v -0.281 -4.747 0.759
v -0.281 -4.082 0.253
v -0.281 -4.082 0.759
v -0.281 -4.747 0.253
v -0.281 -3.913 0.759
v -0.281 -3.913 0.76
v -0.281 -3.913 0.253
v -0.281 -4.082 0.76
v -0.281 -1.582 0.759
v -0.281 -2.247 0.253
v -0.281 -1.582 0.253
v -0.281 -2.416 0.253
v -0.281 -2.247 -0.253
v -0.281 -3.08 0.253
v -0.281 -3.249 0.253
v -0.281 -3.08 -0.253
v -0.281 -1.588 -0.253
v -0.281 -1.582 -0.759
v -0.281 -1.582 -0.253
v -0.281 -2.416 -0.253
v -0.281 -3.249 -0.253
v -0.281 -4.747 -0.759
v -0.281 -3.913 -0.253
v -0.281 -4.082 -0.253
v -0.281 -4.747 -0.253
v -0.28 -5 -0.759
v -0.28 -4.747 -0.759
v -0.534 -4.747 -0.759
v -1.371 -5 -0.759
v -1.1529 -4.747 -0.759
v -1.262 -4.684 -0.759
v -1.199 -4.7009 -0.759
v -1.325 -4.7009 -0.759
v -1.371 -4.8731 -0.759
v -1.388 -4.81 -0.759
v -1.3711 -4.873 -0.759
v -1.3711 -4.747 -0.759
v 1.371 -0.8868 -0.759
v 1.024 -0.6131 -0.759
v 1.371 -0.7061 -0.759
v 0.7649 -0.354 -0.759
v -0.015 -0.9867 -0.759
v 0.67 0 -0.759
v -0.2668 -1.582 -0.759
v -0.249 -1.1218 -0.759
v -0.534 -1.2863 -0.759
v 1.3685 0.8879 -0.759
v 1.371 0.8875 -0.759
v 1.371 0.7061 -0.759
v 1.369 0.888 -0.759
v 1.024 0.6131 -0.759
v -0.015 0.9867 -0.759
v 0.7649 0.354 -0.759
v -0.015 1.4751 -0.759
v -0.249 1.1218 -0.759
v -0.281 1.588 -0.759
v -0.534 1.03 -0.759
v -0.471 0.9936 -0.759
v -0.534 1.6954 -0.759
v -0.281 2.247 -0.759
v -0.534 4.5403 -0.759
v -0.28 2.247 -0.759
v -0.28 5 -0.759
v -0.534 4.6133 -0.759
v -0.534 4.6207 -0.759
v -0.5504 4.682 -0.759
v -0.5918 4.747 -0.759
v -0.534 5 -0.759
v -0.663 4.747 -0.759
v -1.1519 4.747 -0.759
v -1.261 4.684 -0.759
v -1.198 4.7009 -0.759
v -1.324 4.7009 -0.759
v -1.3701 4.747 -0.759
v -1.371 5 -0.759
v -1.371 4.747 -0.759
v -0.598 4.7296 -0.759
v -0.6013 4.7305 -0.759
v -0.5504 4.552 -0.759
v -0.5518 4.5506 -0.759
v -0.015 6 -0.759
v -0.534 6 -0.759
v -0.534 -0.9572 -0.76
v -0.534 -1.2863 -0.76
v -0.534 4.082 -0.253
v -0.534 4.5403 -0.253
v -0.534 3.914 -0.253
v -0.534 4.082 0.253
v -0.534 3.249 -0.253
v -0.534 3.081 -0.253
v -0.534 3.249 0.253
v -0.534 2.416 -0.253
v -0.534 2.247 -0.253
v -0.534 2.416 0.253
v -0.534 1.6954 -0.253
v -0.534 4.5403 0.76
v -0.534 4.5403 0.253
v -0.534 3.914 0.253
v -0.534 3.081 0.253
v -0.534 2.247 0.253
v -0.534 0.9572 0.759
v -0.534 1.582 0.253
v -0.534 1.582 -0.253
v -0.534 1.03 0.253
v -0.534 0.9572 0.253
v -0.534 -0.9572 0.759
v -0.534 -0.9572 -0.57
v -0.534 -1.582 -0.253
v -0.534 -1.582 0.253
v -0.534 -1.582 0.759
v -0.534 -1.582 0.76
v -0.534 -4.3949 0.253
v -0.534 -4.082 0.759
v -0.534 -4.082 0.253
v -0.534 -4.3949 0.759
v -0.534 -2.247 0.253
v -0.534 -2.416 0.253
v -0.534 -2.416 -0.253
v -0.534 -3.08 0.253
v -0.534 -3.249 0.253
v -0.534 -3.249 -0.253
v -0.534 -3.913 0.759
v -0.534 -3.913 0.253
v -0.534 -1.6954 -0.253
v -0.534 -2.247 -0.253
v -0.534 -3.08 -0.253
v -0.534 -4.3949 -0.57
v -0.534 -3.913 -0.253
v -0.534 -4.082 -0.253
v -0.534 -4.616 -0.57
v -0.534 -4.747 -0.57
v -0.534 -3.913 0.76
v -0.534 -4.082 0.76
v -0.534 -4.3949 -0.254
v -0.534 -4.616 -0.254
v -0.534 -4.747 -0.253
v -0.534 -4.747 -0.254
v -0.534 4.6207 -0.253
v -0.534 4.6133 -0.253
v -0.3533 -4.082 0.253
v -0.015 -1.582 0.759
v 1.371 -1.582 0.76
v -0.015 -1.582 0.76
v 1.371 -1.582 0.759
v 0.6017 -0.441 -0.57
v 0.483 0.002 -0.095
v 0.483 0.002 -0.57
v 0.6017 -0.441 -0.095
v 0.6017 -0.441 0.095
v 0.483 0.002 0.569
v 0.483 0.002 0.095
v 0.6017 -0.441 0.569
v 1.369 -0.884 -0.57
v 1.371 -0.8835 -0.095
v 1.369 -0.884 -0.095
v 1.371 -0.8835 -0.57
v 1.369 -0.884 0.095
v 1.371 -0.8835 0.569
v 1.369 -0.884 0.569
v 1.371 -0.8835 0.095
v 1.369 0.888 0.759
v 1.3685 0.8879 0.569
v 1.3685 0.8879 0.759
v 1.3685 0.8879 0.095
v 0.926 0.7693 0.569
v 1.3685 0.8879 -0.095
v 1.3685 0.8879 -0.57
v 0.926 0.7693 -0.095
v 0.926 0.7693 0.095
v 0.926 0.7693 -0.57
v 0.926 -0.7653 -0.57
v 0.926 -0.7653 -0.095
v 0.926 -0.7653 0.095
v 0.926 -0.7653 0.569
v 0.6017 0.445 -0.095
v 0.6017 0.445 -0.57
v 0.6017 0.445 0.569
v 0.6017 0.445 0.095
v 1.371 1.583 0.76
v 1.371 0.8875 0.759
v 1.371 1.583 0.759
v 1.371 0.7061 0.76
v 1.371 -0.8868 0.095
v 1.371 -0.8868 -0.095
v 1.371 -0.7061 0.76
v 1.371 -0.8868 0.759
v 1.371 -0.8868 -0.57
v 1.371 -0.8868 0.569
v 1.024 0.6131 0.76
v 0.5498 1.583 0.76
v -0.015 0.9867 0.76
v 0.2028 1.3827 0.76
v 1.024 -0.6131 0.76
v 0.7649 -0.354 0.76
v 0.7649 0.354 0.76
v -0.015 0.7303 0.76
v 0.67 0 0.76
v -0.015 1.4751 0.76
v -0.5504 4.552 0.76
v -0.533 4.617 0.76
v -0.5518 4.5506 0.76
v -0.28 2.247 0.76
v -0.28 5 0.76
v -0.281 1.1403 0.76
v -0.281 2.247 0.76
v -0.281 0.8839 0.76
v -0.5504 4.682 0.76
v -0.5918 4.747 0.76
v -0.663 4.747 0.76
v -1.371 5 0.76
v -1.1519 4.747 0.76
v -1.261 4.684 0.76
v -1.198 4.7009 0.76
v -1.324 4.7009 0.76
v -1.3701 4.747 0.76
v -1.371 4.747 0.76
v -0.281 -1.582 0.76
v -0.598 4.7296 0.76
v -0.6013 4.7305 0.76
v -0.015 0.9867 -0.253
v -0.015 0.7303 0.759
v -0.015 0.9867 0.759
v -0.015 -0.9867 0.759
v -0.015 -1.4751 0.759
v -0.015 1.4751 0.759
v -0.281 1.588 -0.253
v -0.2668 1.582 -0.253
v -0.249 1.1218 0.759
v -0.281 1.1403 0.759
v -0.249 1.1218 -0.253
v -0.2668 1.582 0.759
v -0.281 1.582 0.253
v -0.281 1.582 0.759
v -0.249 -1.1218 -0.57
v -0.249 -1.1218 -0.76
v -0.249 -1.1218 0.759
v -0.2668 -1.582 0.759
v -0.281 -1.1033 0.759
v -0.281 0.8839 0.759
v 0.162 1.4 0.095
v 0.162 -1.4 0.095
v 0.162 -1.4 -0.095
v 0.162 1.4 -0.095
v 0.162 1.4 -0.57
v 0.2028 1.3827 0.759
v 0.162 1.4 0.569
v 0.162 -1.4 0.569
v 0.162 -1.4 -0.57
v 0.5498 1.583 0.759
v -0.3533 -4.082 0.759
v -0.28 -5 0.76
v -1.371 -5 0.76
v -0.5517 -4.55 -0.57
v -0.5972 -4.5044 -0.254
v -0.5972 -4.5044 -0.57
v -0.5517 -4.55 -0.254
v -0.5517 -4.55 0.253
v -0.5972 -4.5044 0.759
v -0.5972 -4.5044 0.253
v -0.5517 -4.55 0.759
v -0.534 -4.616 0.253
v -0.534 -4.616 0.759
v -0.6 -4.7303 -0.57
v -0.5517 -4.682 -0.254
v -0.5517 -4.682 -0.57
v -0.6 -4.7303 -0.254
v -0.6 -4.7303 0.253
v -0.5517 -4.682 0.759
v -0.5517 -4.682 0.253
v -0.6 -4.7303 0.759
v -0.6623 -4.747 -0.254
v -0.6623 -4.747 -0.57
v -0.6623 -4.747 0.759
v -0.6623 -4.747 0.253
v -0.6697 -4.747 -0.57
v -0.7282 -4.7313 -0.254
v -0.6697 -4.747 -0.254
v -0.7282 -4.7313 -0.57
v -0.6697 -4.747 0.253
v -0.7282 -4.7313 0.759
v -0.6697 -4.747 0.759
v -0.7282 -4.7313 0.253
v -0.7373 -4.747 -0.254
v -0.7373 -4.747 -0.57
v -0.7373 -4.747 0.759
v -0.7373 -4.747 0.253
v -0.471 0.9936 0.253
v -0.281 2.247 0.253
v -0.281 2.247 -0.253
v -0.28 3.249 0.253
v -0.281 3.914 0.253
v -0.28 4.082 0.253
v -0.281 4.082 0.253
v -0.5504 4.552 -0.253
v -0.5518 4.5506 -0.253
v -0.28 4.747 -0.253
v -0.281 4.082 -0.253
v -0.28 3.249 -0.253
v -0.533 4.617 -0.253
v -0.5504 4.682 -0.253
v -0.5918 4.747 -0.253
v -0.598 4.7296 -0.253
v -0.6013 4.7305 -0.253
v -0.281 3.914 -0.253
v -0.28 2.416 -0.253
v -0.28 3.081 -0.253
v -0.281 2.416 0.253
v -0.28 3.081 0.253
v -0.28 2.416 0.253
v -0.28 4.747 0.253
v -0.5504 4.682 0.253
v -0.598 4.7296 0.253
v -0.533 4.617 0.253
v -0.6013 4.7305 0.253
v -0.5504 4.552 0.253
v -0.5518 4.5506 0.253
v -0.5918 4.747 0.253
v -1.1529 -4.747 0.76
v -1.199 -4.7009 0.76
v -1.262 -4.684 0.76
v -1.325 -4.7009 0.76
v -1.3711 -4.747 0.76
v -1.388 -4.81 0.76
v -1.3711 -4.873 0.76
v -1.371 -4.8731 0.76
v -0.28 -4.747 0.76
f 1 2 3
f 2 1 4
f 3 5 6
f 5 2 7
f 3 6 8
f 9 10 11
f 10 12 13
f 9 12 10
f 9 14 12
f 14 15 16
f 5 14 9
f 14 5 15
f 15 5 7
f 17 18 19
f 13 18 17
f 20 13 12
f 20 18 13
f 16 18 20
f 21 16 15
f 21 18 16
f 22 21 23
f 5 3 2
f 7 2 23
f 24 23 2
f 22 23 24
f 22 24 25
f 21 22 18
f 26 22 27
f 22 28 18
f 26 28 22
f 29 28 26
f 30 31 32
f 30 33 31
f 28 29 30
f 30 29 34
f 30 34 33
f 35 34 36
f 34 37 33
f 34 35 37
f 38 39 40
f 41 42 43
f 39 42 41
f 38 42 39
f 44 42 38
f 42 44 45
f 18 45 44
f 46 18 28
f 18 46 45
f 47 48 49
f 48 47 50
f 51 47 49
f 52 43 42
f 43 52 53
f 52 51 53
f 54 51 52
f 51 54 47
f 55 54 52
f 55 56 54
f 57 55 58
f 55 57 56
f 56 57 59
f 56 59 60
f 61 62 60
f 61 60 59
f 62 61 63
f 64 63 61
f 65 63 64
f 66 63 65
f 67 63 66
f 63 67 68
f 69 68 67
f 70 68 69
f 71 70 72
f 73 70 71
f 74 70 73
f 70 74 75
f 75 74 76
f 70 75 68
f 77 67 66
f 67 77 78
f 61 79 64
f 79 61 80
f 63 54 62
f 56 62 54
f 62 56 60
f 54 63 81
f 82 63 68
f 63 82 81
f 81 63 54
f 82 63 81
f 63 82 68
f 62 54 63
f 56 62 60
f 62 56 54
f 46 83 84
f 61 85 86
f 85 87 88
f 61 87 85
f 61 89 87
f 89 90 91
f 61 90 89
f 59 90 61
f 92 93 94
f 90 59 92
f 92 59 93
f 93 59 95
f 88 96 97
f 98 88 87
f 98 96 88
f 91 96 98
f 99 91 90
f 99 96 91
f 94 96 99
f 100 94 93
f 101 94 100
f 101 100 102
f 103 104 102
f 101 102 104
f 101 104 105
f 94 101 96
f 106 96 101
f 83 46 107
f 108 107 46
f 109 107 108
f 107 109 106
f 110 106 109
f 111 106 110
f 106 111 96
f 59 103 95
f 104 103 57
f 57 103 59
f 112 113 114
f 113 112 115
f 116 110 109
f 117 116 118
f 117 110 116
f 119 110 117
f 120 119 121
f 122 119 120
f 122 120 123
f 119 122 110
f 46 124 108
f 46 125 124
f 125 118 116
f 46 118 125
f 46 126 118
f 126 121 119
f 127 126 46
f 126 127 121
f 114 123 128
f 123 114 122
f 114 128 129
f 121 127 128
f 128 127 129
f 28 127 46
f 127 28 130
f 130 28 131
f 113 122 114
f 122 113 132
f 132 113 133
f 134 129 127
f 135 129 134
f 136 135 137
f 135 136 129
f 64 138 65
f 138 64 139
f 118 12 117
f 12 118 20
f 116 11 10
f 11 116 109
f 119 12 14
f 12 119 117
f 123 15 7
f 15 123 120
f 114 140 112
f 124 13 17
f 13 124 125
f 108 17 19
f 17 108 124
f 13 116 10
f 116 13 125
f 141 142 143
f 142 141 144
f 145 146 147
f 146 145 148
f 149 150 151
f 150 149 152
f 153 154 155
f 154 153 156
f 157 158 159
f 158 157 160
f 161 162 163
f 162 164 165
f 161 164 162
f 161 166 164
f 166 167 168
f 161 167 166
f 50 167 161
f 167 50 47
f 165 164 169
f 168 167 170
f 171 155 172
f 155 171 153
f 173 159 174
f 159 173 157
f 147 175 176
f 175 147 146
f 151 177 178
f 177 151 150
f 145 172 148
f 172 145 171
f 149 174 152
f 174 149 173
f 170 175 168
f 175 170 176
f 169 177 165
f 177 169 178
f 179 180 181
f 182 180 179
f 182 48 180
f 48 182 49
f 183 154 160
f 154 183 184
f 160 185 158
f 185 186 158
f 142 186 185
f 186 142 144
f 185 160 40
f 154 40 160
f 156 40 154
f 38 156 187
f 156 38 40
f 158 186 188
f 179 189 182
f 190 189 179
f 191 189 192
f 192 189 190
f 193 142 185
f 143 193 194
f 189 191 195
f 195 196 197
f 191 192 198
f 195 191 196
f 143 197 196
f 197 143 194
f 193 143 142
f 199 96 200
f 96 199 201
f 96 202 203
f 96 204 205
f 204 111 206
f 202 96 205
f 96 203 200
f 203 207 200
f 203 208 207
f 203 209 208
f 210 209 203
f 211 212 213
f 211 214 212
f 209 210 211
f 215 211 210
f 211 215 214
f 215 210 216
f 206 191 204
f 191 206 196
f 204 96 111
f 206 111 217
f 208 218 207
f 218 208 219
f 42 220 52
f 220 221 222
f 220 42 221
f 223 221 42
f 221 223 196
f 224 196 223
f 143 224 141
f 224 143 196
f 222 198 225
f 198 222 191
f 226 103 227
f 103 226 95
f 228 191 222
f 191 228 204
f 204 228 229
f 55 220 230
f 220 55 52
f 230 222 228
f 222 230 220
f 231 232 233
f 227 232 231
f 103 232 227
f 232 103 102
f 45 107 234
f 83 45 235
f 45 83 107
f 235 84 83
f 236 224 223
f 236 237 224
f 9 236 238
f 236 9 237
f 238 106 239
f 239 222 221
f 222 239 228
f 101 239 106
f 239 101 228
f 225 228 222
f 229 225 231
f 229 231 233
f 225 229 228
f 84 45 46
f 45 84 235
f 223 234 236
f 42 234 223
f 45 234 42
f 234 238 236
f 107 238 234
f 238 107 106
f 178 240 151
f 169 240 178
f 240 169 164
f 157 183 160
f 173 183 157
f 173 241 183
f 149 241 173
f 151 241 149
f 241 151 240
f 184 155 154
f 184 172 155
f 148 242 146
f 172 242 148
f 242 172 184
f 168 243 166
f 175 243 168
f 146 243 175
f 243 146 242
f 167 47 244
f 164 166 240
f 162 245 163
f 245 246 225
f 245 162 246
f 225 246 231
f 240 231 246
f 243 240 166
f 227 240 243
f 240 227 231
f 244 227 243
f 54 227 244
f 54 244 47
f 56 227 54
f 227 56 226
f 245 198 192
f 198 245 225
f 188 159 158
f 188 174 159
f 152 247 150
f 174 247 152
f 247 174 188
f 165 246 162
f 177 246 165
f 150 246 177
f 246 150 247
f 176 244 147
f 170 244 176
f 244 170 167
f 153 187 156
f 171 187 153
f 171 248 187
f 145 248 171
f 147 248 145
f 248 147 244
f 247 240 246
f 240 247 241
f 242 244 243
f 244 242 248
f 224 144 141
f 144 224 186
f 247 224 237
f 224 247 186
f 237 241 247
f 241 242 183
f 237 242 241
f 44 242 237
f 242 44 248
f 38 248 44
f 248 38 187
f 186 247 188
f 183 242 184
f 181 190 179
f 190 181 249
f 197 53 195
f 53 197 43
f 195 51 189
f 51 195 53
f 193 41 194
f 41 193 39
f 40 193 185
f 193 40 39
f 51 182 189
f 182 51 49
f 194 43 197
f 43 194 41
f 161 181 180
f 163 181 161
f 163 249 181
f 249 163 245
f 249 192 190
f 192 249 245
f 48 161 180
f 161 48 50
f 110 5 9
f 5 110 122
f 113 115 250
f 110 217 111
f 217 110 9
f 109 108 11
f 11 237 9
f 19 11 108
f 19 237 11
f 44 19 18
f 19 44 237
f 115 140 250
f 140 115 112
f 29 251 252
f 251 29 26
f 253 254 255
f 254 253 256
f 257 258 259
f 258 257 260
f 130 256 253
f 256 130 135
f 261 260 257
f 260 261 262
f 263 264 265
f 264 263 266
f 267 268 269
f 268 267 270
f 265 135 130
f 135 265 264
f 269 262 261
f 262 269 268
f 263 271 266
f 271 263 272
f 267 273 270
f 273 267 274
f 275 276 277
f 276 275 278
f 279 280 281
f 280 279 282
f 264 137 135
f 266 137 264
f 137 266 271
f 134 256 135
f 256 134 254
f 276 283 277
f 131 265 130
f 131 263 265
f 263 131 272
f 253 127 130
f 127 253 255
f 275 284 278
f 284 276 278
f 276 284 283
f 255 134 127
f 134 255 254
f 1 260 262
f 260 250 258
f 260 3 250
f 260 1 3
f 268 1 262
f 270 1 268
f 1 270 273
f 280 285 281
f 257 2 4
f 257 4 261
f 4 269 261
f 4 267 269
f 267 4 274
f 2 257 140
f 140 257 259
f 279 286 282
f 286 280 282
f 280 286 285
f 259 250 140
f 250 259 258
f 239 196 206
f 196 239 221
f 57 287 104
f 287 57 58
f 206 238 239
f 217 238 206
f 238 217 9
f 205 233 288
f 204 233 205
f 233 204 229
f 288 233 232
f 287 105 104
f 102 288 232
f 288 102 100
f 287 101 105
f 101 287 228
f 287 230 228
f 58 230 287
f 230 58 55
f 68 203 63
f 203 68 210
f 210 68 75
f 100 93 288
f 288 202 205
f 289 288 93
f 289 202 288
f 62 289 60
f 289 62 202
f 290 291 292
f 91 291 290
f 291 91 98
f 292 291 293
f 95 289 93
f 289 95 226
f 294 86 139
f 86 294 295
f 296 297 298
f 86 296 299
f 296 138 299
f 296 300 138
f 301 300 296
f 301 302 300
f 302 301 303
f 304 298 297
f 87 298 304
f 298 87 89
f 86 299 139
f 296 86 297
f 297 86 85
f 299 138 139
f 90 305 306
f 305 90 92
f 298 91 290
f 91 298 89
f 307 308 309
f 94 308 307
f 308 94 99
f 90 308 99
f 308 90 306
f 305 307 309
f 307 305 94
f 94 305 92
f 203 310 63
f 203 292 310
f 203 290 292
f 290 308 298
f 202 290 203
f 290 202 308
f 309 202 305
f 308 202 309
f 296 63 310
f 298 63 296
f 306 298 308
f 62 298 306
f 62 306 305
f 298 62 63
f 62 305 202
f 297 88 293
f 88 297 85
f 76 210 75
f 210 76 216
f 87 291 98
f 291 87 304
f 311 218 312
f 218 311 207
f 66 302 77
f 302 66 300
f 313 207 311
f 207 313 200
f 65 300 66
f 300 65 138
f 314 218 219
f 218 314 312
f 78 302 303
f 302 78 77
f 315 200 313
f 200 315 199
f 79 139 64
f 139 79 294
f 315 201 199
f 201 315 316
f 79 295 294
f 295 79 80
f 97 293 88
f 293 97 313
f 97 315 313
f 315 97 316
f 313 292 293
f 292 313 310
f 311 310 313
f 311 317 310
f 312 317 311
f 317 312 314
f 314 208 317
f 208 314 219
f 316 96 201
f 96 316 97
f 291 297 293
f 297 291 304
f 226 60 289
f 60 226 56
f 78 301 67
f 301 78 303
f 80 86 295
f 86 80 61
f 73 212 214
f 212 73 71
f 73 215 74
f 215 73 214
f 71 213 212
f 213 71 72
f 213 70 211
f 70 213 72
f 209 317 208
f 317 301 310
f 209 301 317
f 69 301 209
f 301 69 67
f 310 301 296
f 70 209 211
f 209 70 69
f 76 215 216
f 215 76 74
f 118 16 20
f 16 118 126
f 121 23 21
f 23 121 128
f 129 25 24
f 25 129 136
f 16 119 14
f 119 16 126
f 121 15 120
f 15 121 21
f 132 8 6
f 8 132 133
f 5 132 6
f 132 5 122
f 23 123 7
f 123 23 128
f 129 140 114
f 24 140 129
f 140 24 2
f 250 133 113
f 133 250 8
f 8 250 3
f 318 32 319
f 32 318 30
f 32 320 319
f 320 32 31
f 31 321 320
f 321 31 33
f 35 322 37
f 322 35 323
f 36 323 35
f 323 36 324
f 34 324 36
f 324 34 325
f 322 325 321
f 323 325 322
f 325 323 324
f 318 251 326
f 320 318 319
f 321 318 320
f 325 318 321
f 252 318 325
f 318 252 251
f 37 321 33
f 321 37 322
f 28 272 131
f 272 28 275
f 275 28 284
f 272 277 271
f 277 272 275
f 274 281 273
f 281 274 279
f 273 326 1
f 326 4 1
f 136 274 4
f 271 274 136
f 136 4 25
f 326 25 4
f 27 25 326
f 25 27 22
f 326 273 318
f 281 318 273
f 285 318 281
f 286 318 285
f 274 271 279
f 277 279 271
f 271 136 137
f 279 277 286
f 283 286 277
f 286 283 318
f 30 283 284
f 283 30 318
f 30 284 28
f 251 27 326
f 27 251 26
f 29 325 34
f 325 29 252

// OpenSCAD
intersection() {
translate([-1.646, -6, -0.911]) cube(size = [3.291, 12, 1.823], center = false);
union() {
difference() {
translate([-0.534, -2.416, -0.759]) cube(size = [0.253, 0.833, 1.013], center = false);
translate([-0.534, -2.247, -0.253]) cube(size = [0.253, 0.665, 0.506], center = false);
}
translate([-0.534, -3.249, -0.253]) cube(size = [0.253, 0.169, 0.506], center = false);
translate([-0.534, -4.082, -0.253]) cube(size = [0.253, 0.169, 1.013], center = false);
difference() {
union() {
intersection() {
difference() {
translate([-0.534, -1.582, -0.759]) cube(size = [18.634, 19.682, 18.86], center = false);
translate([1.369, 0.002, -0.759])
cylinder(h = 18.86, r1 = 0.886, r2 = 0.886, center = false, $fn = 12);
}
union() {
translate([-0.015, -1.582, -0.759]) cube(size = [1.386, 3.998, 1.519], center = false);
rotate([0, 0, -30])
translate([-18.1, 0.847, -0.759]) cube(size = [19.835, 17.253, 0.506], center = false);
}
}
intersection() {
difference() {
translate([-0.534, -2.247, -18.1]) cube(size = [0.696, 3.829, 18.86], center = false);
rotate([0, 0, -30])
translate([-18.1, -1.096, -18.1]) cube(size = [36.2, 19.196, 17.53], center = false);
}
difference() {
rotate([-180, 0, 30])
translate([-18.1, -18.1, -0.759]) cube(size = [36.2, 18.947, 1.519], center = false);
rotate([0, 0, -30])
translate([-18.1, -1.096, -0.57]) cube(size = [19.835, 1.943, 1.329], center = false);
}
}
}
union() {
intersection() {
difference() {
rotate([0, 0, -30])
translate([-18.1, -18.1, -0.759]) cube(size = [36.2, 36.2, 1.519], center = false);
rotate([0, 0, -30])
translate([-18.1, -18.1, -0.095]) cube(size = [19.835, 36.2, 0.19], center = false);
}
union() {
rotate([0, 0, -23])
translate([-18.1, 1.352, -18.1]) cube(size = [36.2, 16.748, 18.86], center = false);
translate([0.162, -18.1, -0.57]) cube(size = [17.938, 19.682, 1.139], center = false);
}
}
rotate([0, 0, -23])
translate([-18.1, 1.352, -0.095]) cube(size = [36.2, 16.748, 0.348], center = false);
rotate([-180, 0, 23])
translate([-18.1, 1.352, -0.759]) cube(size = [36.2, 16.748, 1.519], center = false);
}
}
translate([-1.262, -4.81, -0.759])
cylinder(h = 1.519, r1 = 0.126, r2 = 0.126, center = false, $fn = 12);
intersection() {
difference() {
translate([0.162, -1.582, -0.759]) cube(size = [1.209, 3.165, 1.519], center = false);
translate([1.378, 0, -0.759])
cylinder(h = 18.86, r1 = 0.708, r2 = 0.708, center = false, $fn = 12);
}
union() {
rotate([-180, 0, 30])
translate([-18.1, -1.096, -18.1]) cube(size = [36.2, 1.943, 17.341], center = false);
translate([1.369, 0.002, -18.1])
cylinder(h = 18.86, r1 = 0.886, r2 = 0.886, center = false, $fn = 12);
}
}
intersection() {
translate([-0.534, -18.1, 0.253]) cube(size = [0.253, 16.518, 0.506], center = false);
rotate([0, 0, -30])
translate([-18.1, -18.1, 0.253]) cube(size = [19.835, 17.004, 0.506], center = false);
}
intersection() {
difference() {
translate([-18.1, -5, -18.1]) cube(size = [17.819, 23.1, 36.2], center = false);
translate([-0.666, -4.616, -18.1])
cylinder(h = 18.86, r1 = 0.132, r2 = 0.132, center = false, $fn = 12);
}
union() {
rotate([0, 0, -30])
translate([1.735, -18.1, -0.57]) cube(size = [16.365, 36.2, 0.316], center = false);
rotate([0, 0, -30])
translate([1.735, -18.1, 0.253]) cube(size = [16.365, 36.2, 0.506], center = false);
}
}
translate([-0.534, -4.747, -0.759]) cube(size = [0.253, 2.331, 0.506], center = false);
intersection() {
union() {
rotate([0, 0, -30])
translate([-18.1, 0.625, -0.759]) cube(size = [19.835, 0.222, 1.519], center = false);
rotate([0, 0, -30])
translate([-18.1, 0.847, -18.1]) cube(size = [19.835, 17.253, 17.341], center = false);
translate([-0.534, -1.582, 0.253]) cube(size = [0.253, 3.998, 17.847], center = false);
rotate([-180, 0, 30])
translate([-18.1, 0.847, -0.759]) cube(size = [36.2, 17.253, 1.519], center = false);
}
difference() {
union() {
translate([-0.534, -1.582, -0.759]) cube(size = [0.519, 19.682, 1.519], center = false);
translate([-0.534, -2.247, -0.759]) cube(size = [0.253, 4.662, 0.506], center = false);
}
union() {
rotate([-180, 0, 30])
translate([-18.1, -1.096, -0.759]) cube(size = [36.2, 1.943, 1.519], center = false);
rotate([-180, 0, 23])
translate([-18.1, 1.352, -0.759]) cube(size = [36.2, 16.748, 18.86], center = false);
}
}
}
translate([-1.371, -5, -0.759]) cube(size = [1.091, 0.253, 1.519], center = false);
difference() {
intersection() {
difference() {
difference() {
translate([-0.534, 2.247, -18.1]) cube(size = [18.634, 2.753, 36.2], center = false);
translate([-0.534, 3.249, -0.253]) cube(size = [18.634, 1.498, 0.506], center = false);
}
union() {
rotate([0, 0, -30])
translate([-2.886, 3.665, -0.253]) cube(size = [20.986, 14.435, 18.353], center = false);
translate([-0.534, 2.416, -18.1]) cube(size = [18.634, 0.665, 18.353], center = false);
}
}
translate([-1.371, 2.247, -0.759]) cube(size = [1.091, 15.853, 1.519], center = false);
}
intersection() {
union() {
difference() {
translate([-0.534, 3.249, -18.1]) cube(size = [0.253, 0.665, 36.2], center = false);
rotate([0, 0, -30])
translate([-2.886, -18.1, -18.1]) cube(size = [20.986, 21.765, 36.2], center = false);
}
translate([-1.371, 4.082, 0.253]) cube(size = [1.091, 0.665, 0.506], center = false);
}
union() {
difference() {
translate([0, 0, 0]) sphere(r = 54.3, $fn = 12);
rotate([0, 0, -30])
translate([-18.1, -18.1, -0.253]) cube(size = [15.214, 21.765, 1.013], center = false);
}
translate([-1.261, 4.81, -18.1])
cylinder(h = 18.86, r1 = 0.126, r2 = 0.126, center = false, $fn = 12);
}
}
}
intersection() {
difference() {
intersection() {
translate([-1.371, -18.1, -0.759]) cube(size = [1.091, 23.1, 1.519], center = false);
union() {
rotate([0, 0, -30])
translate([-18.1, -18.1, -0.759]) cube(size = [36.2, 36.2, 0.506], center = false);
translate([-1.371, 3.914, -0.253]) cube(size = [1.091, 1.087, 1.013], center = false);
}
}
union() {
rotate([0, 0, -23])
translate([-18.1, -18.1, -0.759]) cube(size = [36.2, 19.452, 0.506], center = false);
translate([-0.663, 4.617, -18.1])
cylinder(h = 18.86, r1 = 0.13, r2 = 0.13, center = false, $fn = 12);
}
}
union() {
rotate([0, 0, -30])
translate([-2.886, 3.665, 0.253]) cube(size = [20.986, 14.435, 17.847], center = false);
translate([-0.534, -18.1, -0.759]) cube(size = [0.253, 22.182, 1.013], center = false);
rotate([0, 0, -30])
translate([-2.886, 3.665, -0.759]) cube(size = [20.986, 14.435, 0.506], center = false);
translate([-0.534, 4.082, 0.253]) cube(size = [18.634, 0.918, 17.847], center = false);
translate([-1.261, 4.81, -18.1])
cylinder(h = 18.86, r1 = 0.126, r2 = 0.126, center = false, $fn = 12);
translate([-0.534, 2.247, -18.1]) cube(size = [18.634, 15.853, 17.847], center = false);
translate([-1.371, 4.747, -18.1]) cube(size = [19.471, 0.253, 36.2], center = false);
}
}
}
}
